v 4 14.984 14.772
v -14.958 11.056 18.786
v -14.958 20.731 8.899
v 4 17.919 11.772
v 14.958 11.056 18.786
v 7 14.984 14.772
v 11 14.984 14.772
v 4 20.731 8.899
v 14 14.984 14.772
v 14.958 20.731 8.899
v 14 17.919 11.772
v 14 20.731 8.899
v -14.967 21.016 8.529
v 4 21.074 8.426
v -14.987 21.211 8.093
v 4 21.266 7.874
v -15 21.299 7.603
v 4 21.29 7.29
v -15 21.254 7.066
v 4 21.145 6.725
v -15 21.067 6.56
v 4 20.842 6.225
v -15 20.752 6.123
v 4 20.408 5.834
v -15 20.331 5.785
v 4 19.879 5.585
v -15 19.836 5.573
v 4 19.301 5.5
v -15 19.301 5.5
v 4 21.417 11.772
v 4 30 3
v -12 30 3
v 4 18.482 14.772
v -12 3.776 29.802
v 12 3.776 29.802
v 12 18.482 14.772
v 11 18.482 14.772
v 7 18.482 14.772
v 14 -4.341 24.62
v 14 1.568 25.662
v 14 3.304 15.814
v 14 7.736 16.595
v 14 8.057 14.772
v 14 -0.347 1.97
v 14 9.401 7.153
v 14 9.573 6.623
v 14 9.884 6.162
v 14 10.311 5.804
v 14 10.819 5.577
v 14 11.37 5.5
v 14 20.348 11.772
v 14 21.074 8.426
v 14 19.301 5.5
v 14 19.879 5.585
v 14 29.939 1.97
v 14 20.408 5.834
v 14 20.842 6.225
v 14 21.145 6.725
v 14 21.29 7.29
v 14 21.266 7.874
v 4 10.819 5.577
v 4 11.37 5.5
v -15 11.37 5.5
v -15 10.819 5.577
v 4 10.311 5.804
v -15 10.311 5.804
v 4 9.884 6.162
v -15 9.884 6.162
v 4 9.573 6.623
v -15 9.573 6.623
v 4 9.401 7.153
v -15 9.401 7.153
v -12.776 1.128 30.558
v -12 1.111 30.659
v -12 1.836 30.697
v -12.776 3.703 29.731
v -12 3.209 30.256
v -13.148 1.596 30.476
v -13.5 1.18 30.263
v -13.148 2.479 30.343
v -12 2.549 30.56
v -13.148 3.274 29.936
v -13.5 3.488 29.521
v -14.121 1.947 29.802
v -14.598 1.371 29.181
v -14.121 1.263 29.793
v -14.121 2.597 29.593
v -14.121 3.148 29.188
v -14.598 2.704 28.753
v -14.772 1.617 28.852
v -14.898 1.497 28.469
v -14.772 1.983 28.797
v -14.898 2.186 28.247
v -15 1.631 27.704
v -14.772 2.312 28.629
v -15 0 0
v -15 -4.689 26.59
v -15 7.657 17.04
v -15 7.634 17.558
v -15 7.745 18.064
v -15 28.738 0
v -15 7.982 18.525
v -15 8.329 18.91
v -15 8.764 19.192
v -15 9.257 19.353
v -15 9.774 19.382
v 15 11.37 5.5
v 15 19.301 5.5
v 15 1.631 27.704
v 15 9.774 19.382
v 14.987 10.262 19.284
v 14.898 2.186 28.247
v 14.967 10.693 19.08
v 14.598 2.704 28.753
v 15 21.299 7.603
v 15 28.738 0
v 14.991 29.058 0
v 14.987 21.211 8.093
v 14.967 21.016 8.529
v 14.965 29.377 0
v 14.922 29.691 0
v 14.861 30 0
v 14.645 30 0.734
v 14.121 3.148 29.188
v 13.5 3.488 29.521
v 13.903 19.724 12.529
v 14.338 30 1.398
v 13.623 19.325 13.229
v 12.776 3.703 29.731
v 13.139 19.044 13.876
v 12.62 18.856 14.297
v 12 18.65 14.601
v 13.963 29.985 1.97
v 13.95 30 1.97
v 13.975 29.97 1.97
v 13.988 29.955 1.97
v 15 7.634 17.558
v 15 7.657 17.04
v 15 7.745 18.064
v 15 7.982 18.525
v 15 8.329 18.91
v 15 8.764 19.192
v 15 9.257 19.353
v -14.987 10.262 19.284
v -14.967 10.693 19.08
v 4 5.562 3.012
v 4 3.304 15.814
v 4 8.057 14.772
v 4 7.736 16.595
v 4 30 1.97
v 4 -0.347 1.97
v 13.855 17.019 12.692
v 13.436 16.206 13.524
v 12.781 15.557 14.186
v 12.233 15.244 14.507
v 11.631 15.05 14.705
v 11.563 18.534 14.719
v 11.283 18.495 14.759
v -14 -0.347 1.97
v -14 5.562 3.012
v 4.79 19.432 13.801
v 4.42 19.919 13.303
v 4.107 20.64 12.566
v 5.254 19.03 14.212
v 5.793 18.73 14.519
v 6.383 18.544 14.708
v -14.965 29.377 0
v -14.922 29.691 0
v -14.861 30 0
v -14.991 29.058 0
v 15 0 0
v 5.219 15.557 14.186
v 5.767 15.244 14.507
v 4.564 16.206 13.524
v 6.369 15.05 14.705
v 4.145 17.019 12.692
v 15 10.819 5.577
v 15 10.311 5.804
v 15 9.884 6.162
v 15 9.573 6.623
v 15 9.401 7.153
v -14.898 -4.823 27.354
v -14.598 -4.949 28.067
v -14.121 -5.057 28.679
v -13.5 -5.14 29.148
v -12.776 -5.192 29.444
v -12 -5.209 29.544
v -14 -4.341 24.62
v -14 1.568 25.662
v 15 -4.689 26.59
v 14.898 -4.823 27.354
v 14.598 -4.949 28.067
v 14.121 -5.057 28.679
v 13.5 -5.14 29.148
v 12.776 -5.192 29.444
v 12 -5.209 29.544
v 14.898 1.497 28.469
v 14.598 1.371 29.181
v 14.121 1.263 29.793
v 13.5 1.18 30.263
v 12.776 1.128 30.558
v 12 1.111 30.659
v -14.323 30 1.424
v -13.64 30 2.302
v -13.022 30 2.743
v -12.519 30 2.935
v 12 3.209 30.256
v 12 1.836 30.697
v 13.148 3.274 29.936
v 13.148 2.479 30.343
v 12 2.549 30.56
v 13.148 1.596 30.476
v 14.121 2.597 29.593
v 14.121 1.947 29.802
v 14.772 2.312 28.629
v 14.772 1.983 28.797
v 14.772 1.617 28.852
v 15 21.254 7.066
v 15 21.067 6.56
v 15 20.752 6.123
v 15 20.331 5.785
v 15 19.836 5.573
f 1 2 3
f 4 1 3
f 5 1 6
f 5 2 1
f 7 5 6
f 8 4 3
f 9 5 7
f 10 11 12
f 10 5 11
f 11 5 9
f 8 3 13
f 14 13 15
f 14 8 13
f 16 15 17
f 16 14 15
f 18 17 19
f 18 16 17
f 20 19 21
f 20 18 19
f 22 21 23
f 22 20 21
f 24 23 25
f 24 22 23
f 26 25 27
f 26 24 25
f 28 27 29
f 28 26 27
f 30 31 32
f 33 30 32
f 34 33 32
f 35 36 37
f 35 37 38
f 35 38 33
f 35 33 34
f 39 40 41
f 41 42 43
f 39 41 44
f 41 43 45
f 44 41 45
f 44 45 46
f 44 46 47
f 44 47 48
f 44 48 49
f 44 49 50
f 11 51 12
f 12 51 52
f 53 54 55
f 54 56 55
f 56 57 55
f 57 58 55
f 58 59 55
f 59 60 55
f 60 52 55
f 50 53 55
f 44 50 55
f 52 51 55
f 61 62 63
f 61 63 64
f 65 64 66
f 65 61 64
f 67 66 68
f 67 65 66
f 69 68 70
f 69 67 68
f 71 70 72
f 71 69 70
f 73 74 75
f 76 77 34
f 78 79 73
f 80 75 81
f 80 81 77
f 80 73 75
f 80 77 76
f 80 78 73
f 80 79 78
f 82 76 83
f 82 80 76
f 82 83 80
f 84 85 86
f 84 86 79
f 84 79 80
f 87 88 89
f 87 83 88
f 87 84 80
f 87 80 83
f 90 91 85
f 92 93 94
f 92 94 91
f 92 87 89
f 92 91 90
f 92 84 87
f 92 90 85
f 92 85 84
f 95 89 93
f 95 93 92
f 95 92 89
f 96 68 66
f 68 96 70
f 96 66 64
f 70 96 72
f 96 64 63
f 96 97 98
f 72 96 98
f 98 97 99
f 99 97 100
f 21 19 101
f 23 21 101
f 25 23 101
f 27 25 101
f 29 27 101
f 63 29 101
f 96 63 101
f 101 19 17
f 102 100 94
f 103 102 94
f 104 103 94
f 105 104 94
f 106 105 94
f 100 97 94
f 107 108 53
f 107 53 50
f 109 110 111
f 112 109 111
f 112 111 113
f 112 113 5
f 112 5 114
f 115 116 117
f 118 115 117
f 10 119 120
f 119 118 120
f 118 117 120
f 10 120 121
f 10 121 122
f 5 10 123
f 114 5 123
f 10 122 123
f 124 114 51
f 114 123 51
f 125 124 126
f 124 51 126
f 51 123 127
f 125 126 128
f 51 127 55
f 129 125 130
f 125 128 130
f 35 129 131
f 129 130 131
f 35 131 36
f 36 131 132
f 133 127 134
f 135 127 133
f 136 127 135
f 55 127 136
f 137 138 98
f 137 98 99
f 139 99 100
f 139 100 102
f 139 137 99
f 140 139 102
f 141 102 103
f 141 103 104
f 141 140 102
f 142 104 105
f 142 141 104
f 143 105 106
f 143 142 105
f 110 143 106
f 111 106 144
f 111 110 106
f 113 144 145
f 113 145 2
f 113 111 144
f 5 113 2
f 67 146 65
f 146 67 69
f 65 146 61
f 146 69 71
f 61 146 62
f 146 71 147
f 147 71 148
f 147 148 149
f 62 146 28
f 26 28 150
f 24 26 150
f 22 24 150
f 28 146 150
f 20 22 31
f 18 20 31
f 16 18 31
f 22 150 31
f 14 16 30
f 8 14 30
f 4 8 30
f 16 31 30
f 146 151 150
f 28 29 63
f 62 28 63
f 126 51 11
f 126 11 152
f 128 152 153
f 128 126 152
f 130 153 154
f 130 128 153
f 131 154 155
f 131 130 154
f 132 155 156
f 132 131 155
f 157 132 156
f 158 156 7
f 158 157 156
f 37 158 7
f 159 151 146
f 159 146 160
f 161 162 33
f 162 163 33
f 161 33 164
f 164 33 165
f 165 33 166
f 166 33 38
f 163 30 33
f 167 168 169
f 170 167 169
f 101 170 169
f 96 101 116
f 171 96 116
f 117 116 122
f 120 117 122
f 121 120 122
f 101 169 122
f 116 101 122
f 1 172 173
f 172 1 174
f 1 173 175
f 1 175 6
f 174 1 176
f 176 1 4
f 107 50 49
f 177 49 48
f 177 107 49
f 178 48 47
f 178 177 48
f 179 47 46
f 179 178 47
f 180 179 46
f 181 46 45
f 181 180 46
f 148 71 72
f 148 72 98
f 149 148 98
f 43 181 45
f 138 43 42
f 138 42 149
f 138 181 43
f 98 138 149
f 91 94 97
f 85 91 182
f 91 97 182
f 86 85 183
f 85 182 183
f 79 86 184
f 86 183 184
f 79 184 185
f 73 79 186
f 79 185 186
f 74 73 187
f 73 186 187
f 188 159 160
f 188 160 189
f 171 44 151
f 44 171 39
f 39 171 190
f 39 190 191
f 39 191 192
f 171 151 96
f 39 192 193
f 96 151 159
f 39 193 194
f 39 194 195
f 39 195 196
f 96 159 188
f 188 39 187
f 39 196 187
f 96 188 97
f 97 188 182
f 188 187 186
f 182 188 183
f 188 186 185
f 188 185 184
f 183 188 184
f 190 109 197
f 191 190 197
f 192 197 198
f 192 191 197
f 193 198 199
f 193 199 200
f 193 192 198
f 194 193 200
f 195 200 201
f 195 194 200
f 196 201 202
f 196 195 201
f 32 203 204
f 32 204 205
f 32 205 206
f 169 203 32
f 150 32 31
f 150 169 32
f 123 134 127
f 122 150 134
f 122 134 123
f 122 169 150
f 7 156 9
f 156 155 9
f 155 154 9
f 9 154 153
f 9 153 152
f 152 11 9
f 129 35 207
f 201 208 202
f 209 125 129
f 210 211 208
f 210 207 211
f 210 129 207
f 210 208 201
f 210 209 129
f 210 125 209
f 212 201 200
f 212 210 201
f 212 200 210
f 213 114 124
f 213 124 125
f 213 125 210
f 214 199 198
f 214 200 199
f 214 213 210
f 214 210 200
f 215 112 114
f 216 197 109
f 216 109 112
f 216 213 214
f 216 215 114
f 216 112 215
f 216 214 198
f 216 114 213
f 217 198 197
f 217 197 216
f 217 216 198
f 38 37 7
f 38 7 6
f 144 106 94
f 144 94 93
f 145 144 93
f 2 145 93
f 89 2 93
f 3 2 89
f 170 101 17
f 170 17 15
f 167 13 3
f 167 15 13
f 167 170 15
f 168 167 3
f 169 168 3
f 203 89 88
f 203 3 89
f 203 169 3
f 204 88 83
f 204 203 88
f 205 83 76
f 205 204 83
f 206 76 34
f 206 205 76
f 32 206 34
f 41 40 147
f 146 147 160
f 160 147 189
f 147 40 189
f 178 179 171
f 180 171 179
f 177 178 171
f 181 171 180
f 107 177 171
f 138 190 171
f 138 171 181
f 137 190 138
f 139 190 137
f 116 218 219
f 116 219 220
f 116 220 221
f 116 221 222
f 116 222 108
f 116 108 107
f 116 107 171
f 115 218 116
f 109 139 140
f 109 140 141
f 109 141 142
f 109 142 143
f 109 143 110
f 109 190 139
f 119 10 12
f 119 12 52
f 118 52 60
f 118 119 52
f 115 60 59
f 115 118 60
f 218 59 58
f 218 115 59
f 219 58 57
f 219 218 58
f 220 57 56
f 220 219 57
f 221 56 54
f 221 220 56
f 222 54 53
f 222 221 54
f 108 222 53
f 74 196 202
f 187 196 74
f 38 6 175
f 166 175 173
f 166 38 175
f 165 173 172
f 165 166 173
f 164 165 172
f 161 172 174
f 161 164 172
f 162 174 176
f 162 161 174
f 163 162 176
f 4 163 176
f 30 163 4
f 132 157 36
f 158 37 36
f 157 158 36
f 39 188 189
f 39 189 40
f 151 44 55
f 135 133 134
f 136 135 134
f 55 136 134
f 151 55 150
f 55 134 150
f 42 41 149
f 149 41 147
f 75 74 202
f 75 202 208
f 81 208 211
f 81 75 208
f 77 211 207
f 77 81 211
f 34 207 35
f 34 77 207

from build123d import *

# Parameters (mm, degrees)
F0_W          = 30
F0_H          = 30
F4_DEPTH      = 3
F3_W          = 30
F3_H          = 30
F5_DEPTH      = 8
F6_DEPTH      = 25
F8_DEPTH      = 6.0000000522
F10_DEPTH     = 30
F7_W          = 10
F7_H          = 11.7721162952
F7_H_2        = 1.030384494
F11_DEPTH     = 35.21044533
F12_T4_DEPTH  = 18.4976166065
F12_T10_DEPTH = 18.4976166065
F12_T15_DEPTH = 17.5385665297
F12_T20_DEPTH = 17.5385665297
F12_T26_DEPTH = 17.5385665297
F12_T31_DEPTH = 17.5385665297
F12_T37_DEPTH = 18.4976166065
F12_T43_DEPTH = 18.4976166065
F12_T45_DEPTH = 13.9174578279
F12_T47_DEPTH = 24
F12_T49_DEPTH = 44.997612514
F12_T54_DEPTH = 3
F12_T60_DEPTH = 3
F3_W_2        = 10
F3_H_2        = 13
F13_DEPTH     = 5.1313021672
F14_DEPTH     = 10.5


# Not quite as in the source:
# - a fillet or chamfer that OpenCascade refuses, or shapes differently, is made with other operations: its cross-section is extruded or revolved along the edge and cut away or added


with BuildPart() as f4:
    # F0 (on Top) → F4 (new body)
    with BuildSketch(Plane.XY):
        with Locations((0, 15)):
            Rectangle(F0_W, F0_H)
    extrude(amount=F4_DEPTH)

    # F3 (on 3pt) → F5 (join)
    with BuildSketch(Plane(origin=(0, 0, 0), x_dir=(-1, 0, 0), z_dir=(0, 0.984807753, 0.1736481777))):
        with Locations((0, 15)):
            Rectangle(F3_W, F3_H)
        Polygon((-14, 2), (-14, 15), (-14, 25), (14, 25), (14, 2), (-4, 2), align=None, mode=Mode.SUBTRACT)
        Polygon((-14, 25), (-14, 15), (-4, 15), (-4, 2), (14, 2), (14, 25), align=None)
    extrude(amount=F5_DEPTH)

    # F0 (on Top) → F6 (cut)
    with BuildSketch(Plane.XY):
        with Locations((0, 15)):
            Rectangle(F0_W, F0_H)
    extrude(amount=-F6_DEPTH, mode=Mode.SUBTRACT)

    # F3 (on 3pt) → F8 (cut)
    with BuildSketch(Plane(origin=(0, 0, 0), x_dir=(-1, 0, 0), z_dir=(0, 0.984807753, 0.1736481777))):
        Polygon((-14, 25), (-14, 15), (-4, 15), (-4, 2), (14, 2), (14, 25), align=None)
    extrude(amount=F8_DEPTH, mode=Mode.SUBTRACT)

    # F9 (on face) → F10 (join, through all)
    with BuildSketch(Plane.YZ.offset(15)):
        Polygon((30, 3), (2.6690166941, 30.9334180117), (7.594431953, 3), align=None)
        with BuildLine():
            ThreePointArc((11.3703802933, 5.5), (10.0848050739, 5.9679111138), (9.4007647872, 7.1527036447))
            Line((9.4007647872, 7.1527036447), (7.6573020205, 17.0403723366))
            ThreePointArc((7.6573020205, 17.0403723366), (8.7131028501, 19.1666972856), (11.0564624317, 18.7863828744))
            Line((11.0564624317, 18.7863828744), (20.7308856563, 8.8987141825))
            ThreePointArc((20.7308856563, 8.8987141825), (21.1449009434, 6.7245737833), (19.3013407511, 5.5))
            Line((19.3013407511, 5.5), (11.3703802933, 5.5))
        make_face(mode=Mode.SUBTRACT)
    extrude(amount=-F10_DEPTH)

    # F7 (on face) → F11 (cut, through all)
    with BuildSketch(Plane(origin=(0, 30, 0), x_dir=(-1, 0, 0), z_dir=(0, 1, 0))):
        with Locations((-9, 8.8860581476)):
            Rectangle(F7_W, F7_H)
        with Locations((-9, 2.484807753)):
            Rectangle(F7_W, F7_H_2)
    extrude(amount=-F11_DEPTH, mode=Mode.SUBTRACT)

    # F12: fillet of radius 3 on 9 edges, made by hand


with BuildPart() as f12_tool2:
    # F12_s3 → F12_t4 (new body)
    with BuildSketch(Plane.XZ.offset(-25.9817706947)):
        with BuildLine():
            ThreePointArc((7, 14.7721162952), (4.8786796564, 13.8934366387), (4, 11.7721162952))
            Line((4, 11.7721162952), (4, 14.7721162952))
            Line((4, 14.7721162952), (7, 14.7721162952))
        make_face()
    extrude(amount=F12_T4_DEPTH)

    split(bisect_by=Plane(origin=(0, 16.8266333185, 16.4637365227), x_dir=(1, 0, 0), z_dir=(0, -0.7147724526, -0.6993570912)), keep=Keep.TOP)

    split(bisect_by=Plane(origin=(0, 15.0397021871, 14.7153437946), x_dir=(1, 0, 0), z_dir=(0, 0.7147724526, 0.6993570912)), keep=Keep.TOP)


with BuildPart() as f4_1:
    add(f4.part)

    # F12_t1: union F12_tool2
    add(f12_tool2.part)


with BuildPart() as f12_tool8:
    # F12_s9 → F12_t10 (new body)
    with BuildSketch(Plane.XZ.offset(-25.9817706947)):
        with BuildLine():
            ThreePointArc((7, 14.7721162952), (4.8786796564, 13.8934366387), (4, 11.7721162952))
            Line((4, 11.7721162952), (4, 14.7721162952))
            Line((4, 14.7721162952), (7, 14.7721162952))
        make_face()
    extrude(amount=F12_T10_DEPTH)

    split(bisect_by=Plane(origin=(0, 10.3404814066, 1.8233058655), x_dir=(1, 0, 0), z_dir=(0, -0.984807753, -0.1736481777)), keep=Keep.TOP)


with BuildPart() as f4_2:
    add(f4_1.part)

    # F12_t7: union F12_tool8
    add(f12_tool8.part)


with BuildPart() as f12_tool13:
    # F12_s14 → F12_t15 (new body)
    with BuildSketch(Plane.XZ.offset(-15.5572567598)):
        with BuildLine():
            ThreePointArc((7, 14.7721162952), (4.8786796564, 13.8934366387), (4, 11.7721162952))
            Line((4, 11.7721162952), (4, 14.7721162952))
            Line((4, 14.7721162952), (7, 14.7721162952))
        make_face()
    extrude(amount=F12_T15_DEPTH)

    split(bisect_by=Plane(origin=(0, 15.0397021871, 14.7153437946), x_dir=(1, 0, 0), z_dir=(0, 0.7147724526, 0.6993570912)), keep=Keep.TOP)


with BuildPart() as f4_3:
    add(f4_2.part)

    # F12_t12: union F12_tool13
    add(f12_tool13.part)


with BuildPart() as f12_tool18:
    # F12_s19 → F12_t20 (new body)
    with BuildSketch(Plane.XZ.offset(-15.5572567598)):
        with BuildLine():
            ThreePointArc((7, 14.7721162952), (4.8786796564, 13.8934366387), (4, 11.7721162952))
            Line((4, 11.7721162952), (4, 14.7721162952))
            Line((4, 14.7721162952), (7, 14.7721162952))
        make_face()
    extrude(amount=F12_T20_DEPTH)

    split(bisect_by=Plane(origin=(0, 10.3404814066, 1.8233058655), x_dir=(1, 0, 0), z_dir=(0, -0.984807753, -0.1736481777)), keep=Keep.TOP)

    split(bisect_by=Plane(origin=(0, 7.8784620241, 1.3891854213), x_dir=(1, 0, 0), z_dir=(0, 0.984807753, 0.1736481777)), keep=Keep.TOP)


with BuildPart() as f4_4:
    add(f4_3.part)

    # F12_t17: union F12_tool18
    add(f12_tool18.part)


with BuildPart() as f12_tool24:
    # F12_s25 → F12_t26 (new body)
    with BuildSketch(Plane.XZ.offset(-15.5572567598)):
        with BuildLine():
            ThreePointArc((14, 11.7721162952), (13.1213203436, 13.8934366387), (11, 14.7721162952))
            Line((11, 14.7721162952), (14, 14.7721162952))
            Line((14, 14.7721162952), (14, 11.7721162952))
        make_face()
    extrude(amount=F12_T26_DEPTH)

    split(bisect_by=Plane(origin=(0, 15.0397021871, 14.7153437946), x_dir=(1, 0, 0), z_dir=(0, 0.7147724526, 0.6993570912)), keep=Keep.TOP)


with BuildPart() as f4_5:
    add(f4_4.part)

    # F12_t23: union F12_tool24
    add(f12_tool24.part)


with BuildPart() as f12_tool29:
    # F12_s30 → F12_t31 (new body)
    with BuildSketch(Plane.XZ.offset(-15.5572567598)):
        with BuildLine():
            ThreePointArc((14, 11.7721162952), (13.1213203436, 13.8934366387), (11, 14.7721162952))
            Line((11, 14.7721162952), (14, 14.7721162952))
            Line((14, 14.7721162952), (14, 11.7721162952))
        make_face()
    extrude(amount=F12_T31_DEPTH)

    split(bisect_by=Plane(origin=(0, 10.3404814066, 1.8233058655), x_dir=(1, 0, 0), z_dir=(0, -0.984807753, -0.1736481777)), keep=Keep.TOP)

    split(bisect_by=Plane(origin=(0, 7.8784620241, 1.3891854213), x_dir=(1, 0, 0), z_dir=(0, 0.984807753, 0.1736481777)), keep=Keep.TOP)


with BuildPart() as f4_6:
    add(f4_5.part)

    # F12_t28: union F12_tool29
    add(f12_tool29.part)


with BuildPart() as f12_tool35:
    # F12_s36 → F12_t37 (new body)
    with BuildSketch(Plane.XZ.offset(-25.9817706947)):
        with BuildLine():
            ThreePointArc((14, 11.7721162952), (13.1213203436, 13.8934366387), (11, 14.7721162952))
            Line((11, 14.7721162952), (14, 14.7721162952))
            Line((14, 14.7721162952), (14, 11.7721162952))
        make_face()
    extrude(amount=F12_T37_DEPTH)

    split(bisect_by=Plane(origin=(0, 16.8266333185, 16.4637365227), x_dir=(1, 0, 0), z_dir=(0, -0.7147724526, -0.6993570912)), keep=Keep.TOP)

    split(bisect_by=Plane(origin=(0, 15.0397021871, 14.7153437946), x_dir=(1, 0, 0), z_dir=(0, 0.7147724526, 0.6993570912)), keep=Keep.TOP)


with BuildPart() as f4_7:
    add(f4_6.part)

    # F12_t34: union F12_tool35
    add(f12_tool35.part)


with BuildPart() as f12_tool41:
    # F12_s42 → F12_t43 (new body)
    with BuildSketch(Plane.XZ.offset(-25.9817706947)):
        with BuildLine():
            ThreePointArc((14, 11.7721162952), (13.1213203436, 13.8934366387), (11, 14.7721162952))
            Line((11, 14.7721162952), (14, 14.7721162952))
            Line((14, 14.7721162952), (14, 11.7721162952))
        make_face()
    extrude(amount=F12_T43_DEPTH)

    split(bisect_by=Plane(origin=(0, 10.3404814066, 1.8233058655), x_dir=(1, 0, 0), z_dir=(0, -0.984807753, -0.1736481777)), keep=Keep.TOP)


with BuildPart() as f4_8:
    add(f4_7.part)

    # F12_t40: union F12_tool41
    add(f12_tool41.part)

    # F12_s46 → F12_t45 (cut)
    with BuildSketch(Plane(origin=(0, -7.3860581476, -1.3023613325), x_dir=(1, 0, 0), z_dir=(0, 0.984807753, 0.1736481777))):
        with BuildLine():
            ThreePointArc((-15, -27), (-14.1213203436, -29.1213203436), (-12, -30))
            Line((-12, -30), (-15, -30))
            Line((-15, -30), (-15, -27))
        make_face()
        with BuildLine():
            ThreePointArc((15, -27), (14.1213203436, -29.1213203436), (12, -30))
            Line((12, -30), (15, -30))
            Line((15, -30), (15, -27))
        make_face()
    extrude(amount=F12_T45_DEPTH, mode=Mode.SUBTRACT)

    # F12_s48 → F12_t47 (cut)
    with BuildSketch(Plane.YZ.offset(-12)):
        with BuildLine():
            ThreePointArc((1.1105168936, 30.6586124474), (2.5491593686, 30.5603807939), (3.7757787843, 29.8022604621))
            Line((3.7757787843, 29.8022604621), (2.6690166941, 30.9334180117))
            Line((2.6690166941, 30.9334180117), (1.1105168936, 30.6586124474))
        make_face()
    extrude(amount=F12_T47_DEPTH, mode=Mode.SUBTRACT)

    # F12_s50 → F12_t49 (cut)
    with BuildSketch(Plane(origin=(0, 18.4185448657, -18.8245299169), x_dir=(1, 0, 0), z_dir=(0, -0.6993570912, 0.7147724526))):
        with BuildLine():
            ThreePointArc((-15, 20.5412448507), (-14.1213203436, 22.6625651943), (-12, 23.5412448507))
            Line((-12, 23.5412448507), (-15, 23.5412448507))
            Line((-15, 23.5412448507), (-15, 20.5412448507))
        make_face()
        with BuildLine():
            ThreePointArc((15, 20.5412448507), (14.1213203436, 22.6625651943), (12, 23.5412448507))
            Line((12, 23.5412448507), (15, 23.5412448507))
            Line((15, 23.5412448507), (15, 20.5412448507))
        make_face()
    extrude(amount=F12_T49_DEPTH, mode=Mode.SUBTRACT)


with BuildPart() as f12_tool52:
    # F12_s53 → F12_t54 (new body)
    with BuildSketch(Plane.YZ.offset(-12)):
        Polygon((1.6314614266, 27.7041891884), (1.1105168936, 30.6586124474), (2.6690166941, 30.9334180117), (3.7757787843, 29.8022604621), align=None)
    extrude(amount=-F12_T54_DEPTH)

    # F12_s55 → F12_t56 (revolve, cut)
    with BuildSketch(Plane(origin=(-12, 1.6314614266, 27.7041891884), x_dir=(0, -0.305899314, -0.9520638685), z_dir=(0, 0.9520638685, -0.305899314))):
        with BuildLine():
            ThreePointArc((0, -3), (3, 0), (0, 3))
            Line((0, 3), (0, -3))
        make_face()
    revolve(axis=Axis((-12, 1.6314614266, 27.7041891884), (-1, 0, 0)), mode=Mode.SUBTRACT)


with BuildPart() as f4_9:
    add(f4_8.part)

    # F12_t51: cut F12_tool52
    add(f12_tool52.part, mode=Mode.SUBTRACT)


with BuildPart() as f12_tool58:
    # F12_s59 → F12_t60 (new body)
    with BuildSketch(Plane.YZ.offset(12)):
        Polygon((1.6314614266, 27.7041891884), (3.7757787843, 29.8022604621), (2.6690166941, 30.9334180117), (1.1105168936, 30.6586124474), align=None)
    extrude(amount=F12_T60_DEPTH)

    # F12_s61 → F12_t62 (revolve, cut)
    with BuildSketch(Plane(origin=(12, 1.6314614266, 27.7041891884), x_dir=(0, -0.305899314, -0.9520638685), z_dir=(0, -0.9520638685, 0.305899314))):
        with BuildLine():
            ThreePointArc((0, -3), (3, 0), (0, 3))
            Line((0, 3), (0, -3))
        make_face()
    revolve(axis=Axis((12, 1.6314614266, 27.7041891884), (1, 0, 0)), mode=Mode.SUBTRACT)


with BuildPart() as f4_10:
    add(f4_9.part)

    # F12_t57: cut F12_tool58
    add(f12_tool58.part, mode=Mode.SUBTRACT)

    # F3 (on 3pt) → F13 (cut, through all)
    with BuildSketch(Plane(origin=(0, 0, 0), x_dir=(-1, 0, 0), z_dir=(0, 0.984807753, 0.1736481777))):
        with Locations((0, 15)):
            Rectangle(F3_W, F3_H)
        Polygon((-14, 2), (-14, 15), (-14, 25), (14, 25), (14, 2), (-4, 2), align=None, mode=Mode.SUBTRACT)
        Polygon((-14, 25), (-14, 15), (-4, 15), (-4, 2), (14, 2), (14, 25), align=None)
        with Locations((-9, 8.5)):
            Rectangle(F3_W_2, F3_H_2)
    extrude(amount=-F13_DEPTH, mode=Mode.SUBTRACT)

    # F3 (on 3pt) → F14 (cut, through all)
    with BuildSketch(Plane(origin=(0, 0, 0), x_dir=(-1, 0, 0), z_dir=(0, 0.984807753, 0.1736481777))):
        with Locations((-9, 8.5)):
            Rectangle(F3_W_2, F3_H_2)
    extrude(amount=F14_DEPTH, mode=Mode.SUBTRACT)


solid = f4_10.part
